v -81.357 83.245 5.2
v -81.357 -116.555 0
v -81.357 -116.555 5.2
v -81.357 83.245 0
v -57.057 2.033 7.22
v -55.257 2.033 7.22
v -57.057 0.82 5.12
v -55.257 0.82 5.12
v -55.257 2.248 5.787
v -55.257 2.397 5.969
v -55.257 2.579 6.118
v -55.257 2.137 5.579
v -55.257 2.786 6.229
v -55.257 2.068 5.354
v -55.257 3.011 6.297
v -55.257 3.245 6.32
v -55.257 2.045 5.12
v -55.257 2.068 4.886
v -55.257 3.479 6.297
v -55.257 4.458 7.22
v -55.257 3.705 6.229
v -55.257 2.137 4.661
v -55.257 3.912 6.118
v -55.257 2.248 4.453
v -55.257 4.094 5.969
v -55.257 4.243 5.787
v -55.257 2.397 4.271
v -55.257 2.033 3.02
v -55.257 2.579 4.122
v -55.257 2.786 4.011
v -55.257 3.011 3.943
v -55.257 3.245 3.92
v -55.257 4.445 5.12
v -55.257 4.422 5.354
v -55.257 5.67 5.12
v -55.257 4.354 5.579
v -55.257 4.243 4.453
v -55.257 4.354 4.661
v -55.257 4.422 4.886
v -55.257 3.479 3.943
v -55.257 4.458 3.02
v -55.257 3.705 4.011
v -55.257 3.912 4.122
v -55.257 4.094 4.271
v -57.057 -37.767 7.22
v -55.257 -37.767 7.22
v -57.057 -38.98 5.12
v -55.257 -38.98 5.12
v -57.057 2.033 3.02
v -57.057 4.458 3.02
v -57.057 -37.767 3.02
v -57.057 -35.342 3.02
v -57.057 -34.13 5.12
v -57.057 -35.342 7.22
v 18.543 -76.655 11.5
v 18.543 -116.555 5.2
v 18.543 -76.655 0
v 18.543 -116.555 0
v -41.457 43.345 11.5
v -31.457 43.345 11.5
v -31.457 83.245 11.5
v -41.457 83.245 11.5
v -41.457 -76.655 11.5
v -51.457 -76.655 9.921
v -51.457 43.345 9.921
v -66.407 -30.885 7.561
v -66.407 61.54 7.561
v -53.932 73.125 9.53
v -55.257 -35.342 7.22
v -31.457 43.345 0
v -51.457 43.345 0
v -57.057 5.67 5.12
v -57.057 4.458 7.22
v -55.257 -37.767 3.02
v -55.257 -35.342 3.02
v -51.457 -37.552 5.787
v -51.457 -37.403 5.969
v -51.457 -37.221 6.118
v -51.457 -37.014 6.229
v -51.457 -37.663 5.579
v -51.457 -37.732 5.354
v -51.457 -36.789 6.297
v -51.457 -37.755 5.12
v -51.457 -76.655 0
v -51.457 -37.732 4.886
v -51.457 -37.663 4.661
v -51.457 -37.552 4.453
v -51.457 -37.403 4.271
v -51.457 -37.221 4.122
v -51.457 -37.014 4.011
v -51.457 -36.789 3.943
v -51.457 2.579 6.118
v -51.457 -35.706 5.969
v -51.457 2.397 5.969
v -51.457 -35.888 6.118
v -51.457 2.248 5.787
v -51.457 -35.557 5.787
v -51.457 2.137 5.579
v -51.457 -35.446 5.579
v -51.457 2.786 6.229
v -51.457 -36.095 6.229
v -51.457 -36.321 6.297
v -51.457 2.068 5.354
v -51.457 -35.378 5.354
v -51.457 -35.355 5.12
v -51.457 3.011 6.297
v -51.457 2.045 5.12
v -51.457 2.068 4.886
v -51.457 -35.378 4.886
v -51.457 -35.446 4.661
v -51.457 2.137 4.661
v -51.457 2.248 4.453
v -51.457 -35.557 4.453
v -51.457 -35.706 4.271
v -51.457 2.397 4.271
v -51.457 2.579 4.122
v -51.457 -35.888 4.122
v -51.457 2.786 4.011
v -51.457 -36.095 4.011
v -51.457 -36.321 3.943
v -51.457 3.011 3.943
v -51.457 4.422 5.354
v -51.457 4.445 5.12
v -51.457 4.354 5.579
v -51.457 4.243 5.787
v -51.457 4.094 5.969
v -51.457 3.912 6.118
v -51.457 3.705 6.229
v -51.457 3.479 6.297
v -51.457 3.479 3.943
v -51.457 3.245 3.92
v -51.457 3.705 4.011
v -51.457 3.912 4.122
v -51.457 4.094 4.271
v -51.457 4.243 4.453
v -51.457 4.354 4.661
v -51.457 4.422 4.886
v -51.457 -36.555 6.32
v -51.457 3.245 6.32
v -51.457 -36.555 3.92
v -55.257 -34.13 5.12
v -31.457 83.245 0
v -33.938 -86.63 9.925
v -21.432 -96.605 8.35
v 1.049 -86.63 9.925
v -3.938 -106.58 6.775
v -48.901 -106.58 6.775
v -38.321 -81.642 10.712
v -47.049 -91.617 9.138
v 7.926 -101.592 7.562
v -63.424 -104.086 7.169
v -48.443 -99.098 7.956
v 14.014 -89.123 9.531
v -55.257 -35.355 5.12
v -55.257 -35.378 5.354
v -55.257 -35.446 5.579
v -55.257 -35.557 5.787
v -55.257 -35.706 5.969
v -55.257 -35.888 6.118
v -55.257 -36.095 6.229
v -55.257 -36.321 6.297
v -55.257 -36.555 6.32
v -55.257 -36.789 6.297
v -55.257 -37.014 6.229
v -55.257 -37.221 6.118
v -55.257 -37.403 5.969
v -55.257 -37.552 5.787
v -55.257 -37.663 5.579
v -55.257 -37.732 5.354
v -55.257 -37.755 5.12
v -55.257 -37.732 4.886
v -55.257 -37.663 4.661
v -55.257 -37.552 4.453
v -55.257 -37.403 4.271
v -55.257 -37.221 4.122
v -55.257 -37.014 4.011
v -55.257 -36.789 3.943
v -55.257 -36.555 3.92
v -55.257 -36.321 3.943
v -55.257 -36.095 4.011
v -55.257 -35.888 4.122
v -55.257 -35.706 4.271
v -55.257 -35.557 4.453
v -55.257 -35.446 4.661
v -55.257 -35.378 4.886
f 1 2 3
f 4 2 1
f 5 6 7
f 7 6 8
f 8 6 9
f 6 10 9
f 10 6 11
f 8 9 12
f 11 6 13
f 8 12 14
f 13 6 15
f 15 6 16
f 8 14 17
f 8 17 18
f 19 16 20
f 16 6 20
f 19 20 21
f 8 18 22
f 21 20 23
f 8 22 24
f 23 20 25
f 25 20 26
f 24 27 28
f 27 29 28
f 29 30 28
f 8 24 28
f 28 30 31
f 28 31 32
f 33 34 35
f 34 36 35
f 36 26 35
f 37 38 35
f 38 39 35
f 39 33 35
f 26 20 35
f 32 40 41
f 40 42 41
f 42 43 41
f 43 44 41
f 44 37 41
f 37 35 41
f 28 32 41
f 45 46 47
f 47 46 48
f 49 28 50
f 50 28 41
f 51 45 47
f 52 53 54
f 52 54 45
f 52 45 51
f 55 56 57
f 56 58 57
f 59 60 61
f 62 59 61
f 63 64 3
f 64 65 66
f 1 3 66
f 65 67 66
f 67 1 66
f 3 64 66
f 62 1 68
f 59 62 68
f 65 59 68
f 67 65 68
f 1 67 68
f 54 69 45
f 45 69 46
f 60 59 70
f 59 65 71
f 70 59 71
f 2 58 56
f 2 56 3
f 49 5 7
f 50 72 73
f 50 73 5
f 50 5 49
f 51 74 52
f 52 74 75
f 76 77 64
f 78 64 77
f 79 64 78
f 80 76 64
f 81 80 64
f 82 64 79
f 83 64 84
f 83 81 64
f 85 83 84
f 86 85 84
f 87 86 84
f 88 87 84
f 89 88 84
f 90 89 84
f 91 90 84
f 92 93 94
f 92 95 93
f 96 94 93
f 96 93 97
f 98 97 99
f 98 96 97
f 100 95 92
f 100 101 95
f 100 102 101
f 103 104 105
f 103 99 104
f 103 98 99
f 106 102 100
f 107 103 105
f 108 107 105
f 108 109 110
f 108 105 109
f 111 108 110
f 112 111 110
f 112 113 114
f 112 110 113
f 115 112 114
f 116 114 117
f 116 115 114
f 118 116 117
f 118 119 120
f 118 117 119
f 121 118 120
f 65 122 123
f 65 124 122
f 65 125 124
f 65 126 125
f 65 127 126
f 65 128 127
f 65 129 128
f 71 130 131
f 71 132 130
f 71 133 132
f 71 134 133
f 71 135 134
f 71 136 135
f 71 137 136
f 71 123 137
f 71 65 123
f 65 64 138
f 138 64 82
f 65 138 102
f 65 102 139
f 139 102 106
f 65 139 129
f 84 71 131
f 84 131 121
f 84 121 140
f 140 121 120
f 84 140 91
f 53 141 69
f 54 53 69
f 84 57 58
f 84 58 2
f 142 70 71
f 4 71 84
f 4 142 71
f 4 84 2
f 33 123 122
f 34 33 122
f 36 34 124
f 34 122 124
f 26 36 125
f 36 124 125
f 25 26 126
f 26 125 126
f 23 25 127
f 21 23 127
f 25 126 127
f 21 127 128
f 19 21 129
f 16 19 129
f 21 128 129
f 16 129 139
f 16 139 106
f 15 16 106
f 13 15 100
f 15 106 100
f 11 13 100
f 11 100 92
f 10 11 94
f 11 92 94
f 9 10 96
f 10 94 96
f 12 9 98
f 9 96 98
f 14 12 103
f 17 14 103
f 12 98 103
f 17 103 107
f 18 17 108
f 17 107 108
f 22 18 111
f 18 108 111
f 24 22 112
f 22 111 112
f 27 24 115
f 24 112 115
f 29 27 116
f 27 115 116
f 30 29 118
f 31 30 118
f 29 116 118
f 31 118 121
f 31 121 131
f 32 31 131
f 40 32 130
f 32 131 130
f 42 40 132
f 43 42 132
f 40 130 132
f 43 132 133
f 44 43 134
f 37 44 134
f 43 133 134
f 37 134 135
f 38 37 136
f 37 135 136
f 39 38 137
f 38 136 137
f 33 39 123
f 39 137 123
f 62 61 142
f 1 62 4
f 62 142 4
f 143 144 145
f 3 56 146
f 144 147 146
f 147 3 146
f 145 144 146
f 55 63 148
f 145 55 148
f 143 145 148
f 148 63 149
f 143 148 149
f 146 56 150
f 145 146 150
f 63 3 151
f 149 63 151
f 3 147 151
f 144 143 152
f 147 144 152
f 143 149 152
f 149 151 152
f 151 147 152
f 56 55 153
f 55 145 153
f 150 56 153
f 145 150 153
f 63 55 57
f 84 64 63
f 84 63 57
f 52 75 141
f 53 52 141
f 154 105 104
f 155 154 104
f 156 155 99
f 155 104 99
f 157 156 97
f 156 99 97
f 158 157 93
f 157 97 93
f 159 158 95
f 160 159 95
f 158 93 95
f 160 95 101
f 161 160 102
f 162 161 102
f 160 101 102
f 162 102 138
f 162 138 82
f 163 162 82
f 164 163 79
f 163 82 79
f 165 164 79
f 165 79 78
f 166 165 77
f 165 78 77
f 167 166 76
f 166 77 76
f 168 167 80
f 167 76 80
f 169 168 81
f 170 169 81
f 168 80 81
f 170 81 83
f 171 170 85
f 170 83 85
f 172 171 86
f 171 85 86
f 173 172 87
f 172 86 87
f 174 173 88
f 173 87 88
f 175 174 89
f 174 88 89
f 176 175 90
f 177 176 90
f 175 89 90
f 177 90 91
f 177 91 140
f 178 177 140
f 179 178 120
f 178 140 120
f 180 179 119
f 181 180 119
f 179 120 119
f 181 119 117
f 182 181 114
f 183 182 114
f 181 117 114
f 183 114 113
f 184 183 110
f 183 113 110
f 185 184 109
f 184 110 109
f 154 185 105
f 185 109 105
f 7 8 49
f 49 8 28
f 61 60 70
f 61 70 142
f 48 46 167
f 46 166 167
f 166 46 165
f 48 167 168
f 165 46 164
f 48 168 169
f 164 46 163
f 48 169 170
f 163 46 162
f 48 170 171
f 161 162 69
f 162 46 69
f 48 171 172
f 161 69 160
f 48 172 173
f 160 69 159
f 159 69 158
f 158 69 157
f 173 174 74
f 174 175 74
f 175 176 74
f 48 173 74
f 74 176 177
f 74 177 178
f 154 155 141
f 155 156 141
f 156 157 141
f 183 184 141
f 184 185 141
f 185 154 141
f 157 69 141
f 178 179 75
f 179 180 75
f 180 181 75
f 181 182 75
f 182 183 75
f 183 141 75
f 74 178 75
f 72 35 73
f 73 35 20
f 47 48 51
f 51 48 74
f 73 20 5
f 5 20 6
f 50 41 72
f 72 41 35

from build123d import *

# Parameters (mm, degrees)
DODANIE_WYCI_GNI_CIE1_DEPTH = 5.2
SZKIC6_W                    = 49.271239353
SZKIC6_H                    = 120
WYTNIJ_WYCI_GNI_CIE1_DEPTH  = 78
WYTNIJ_WYCI_GNI_CIE2_DEPTH  = 5.6
SZKIC9_R                    = 2.424871131
SZKIC9_R_2                  = 1.2
DODANIE_WYCI_GNI_CIE3_DEPTH = 3.8
SZKIC10_W                   = 50
SZKIC10_H                   = 39.9
WYTNIJ_WYCI_GNI_CIE4_DEPTH  = 24


with BuildPart() as part:
    # Szkic2 → Dodanie-wyciągnięcie1 (new body)
    with BuildSketch(Plane.XY):
        Polygon((18.542832418, 83.245366469), (18.542832418, 43.345366469), (-51.457167582, 43.345366469), (-51.457167582, -76.654633531), (18.542832418, -76.654633531), (18.542832418, -116.554633531), (-81.357167582, -116.554633531), (-81.357167582, 83.245366469), align=None)
    extrude(amount=DODANIE_WYCI_GNI_CIE1_DEPTH)

    # Szkic3 → Wyciągnięcie po profilach3 section 0
    with BuildSketch(Plane.XY.offset(11.5)):
        with BuildLine():
            Line((-41.457167582, -76.654633531), (18.542832418, -76.654633531))
            Line((18.542832418, -76.654633531), (18.542832418, 83.245366469))
            Line((18.542832418, 83.245366469), (-41.457167582, 83.245366469))
            Line((-41.457167582, 83.245366469), (-41.457167582, -76.654633531))
        make_face()
    # Szkic5 → Wyciągnięcie po profilach3 section 1
    with BuildSketch(Plane.XY.offset(5.2)):
        with BuildLine():
            Line((-81.357167582, 83.245366469), (18.542832418, 83.245366469))
            Line((18.542832418, 83.245366469), (18.542832418, -116.554633531))
            Line((18.542832418, -116.554633531), (-81.357167582, -116.554633531))
            Line((-81.357167582, -116.554633531), (-81.357167582, 83.245366469))
        make_face()
    loft()

    # Szkic6 → Wytnij-wyciągnięcie1 (cut)
    with BuildSketch(Plane(origin=(-51.457167582, 0, 0), x_dir=(0, 0, -1), z_dir=(1, 0, 0))):
        with Locations((-24.635619677, -16.654633531)):
            Rectangle(SZKIC6_W, SZKIC6_H)
    extrude(amount=WYTNIJ_WYCI_GNI_CIE1_DEPTH, mode=Mode.SUBTRACT)

    # Szkic7 → Wytnij-wyciągnięcie2 (cut)
    with BuildSketch(Plane(origin=(-51.457167582, 0, 0), x_dir=(0, 0, -1), z_dir=(1, 0, 0))):
        Polygon((-5.12, -34.1297624), (-7.22, -35.342197966), (-7.22, -37.767069096), (-5.12, -38.979504662), (-3.02, -37.767069096), (-3.02, -35.342197966), align=None)
        Polygon((-5.12, 5.6702376), (-7.22, 4.457802034), (-7.22, 2.032930904), (-5.12, 0.820495338), (-3.02, 2.032930904), (-3.02, 4.457802034), align=None)
    extrude(amount=-WYTNIJ_WYCI_GNI_CIE2_DEPTH, mode=Mode.SUBTRACT)

    # Szkic9 → Dodanie-wyciągnięcie3 (add)
    # profile 1 of 2: a face of its own
    with BuildSketch(Plane(origin=(-51.457167582, 0, 0), x_dir=(0, 0, -1), z_dir=(1, 0, 0))):
        with Locations((-5.12, 3.245366469)):
            Circle(SZKIC9_R)
        with Locations((-5.12, 3.245366469)):
            Circle(SZKIC9_R_2, mode=Mode.SUBTRACT)
    # profile 2 of 2: a face of its own
    with BuildSketch(Plane(origin=(-51.457167582, 0, 0), x_dir=(0, 0, -1), z_dir=(1, 0, 0))):
        with Locations((-5.12, -36.554633531)):
            Circle(SZKIC9_R)
        with Locations((-5.12, -36.554633531)):
            Circle(SZKIC9_R_2, mode=Mode.SUBTRACT)
    extrude(amount=-DODANIE_WYCI_GNI_CIE3_DEPTH)

    # Szkic10 → Wytnij-wyciągnięcie4 (cut)
    with BuildSketch(Plane.XY.offset(11.5)):
        with Locations((-6.457167582, 63.295366469)):
            Rectangle(SZKIC10_W, SZKIC10_H)
    extrude(amount=-WYTNIJ_WYCI_GNI_CIE4_DEPTH, mode=Mode.SUBTRACT)


solid = part.part
